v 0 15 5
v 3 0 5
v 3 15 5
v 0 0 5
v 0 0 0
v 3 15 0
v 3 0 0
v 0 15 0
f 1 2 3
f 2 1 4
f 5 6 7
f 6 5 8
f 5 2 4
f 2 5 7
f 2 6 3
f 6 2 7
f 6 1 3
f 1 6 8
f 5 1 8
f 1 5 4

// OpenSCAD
// Generated by SolidPython 1.0.1 on 2020-07-29 00:46:54


cube(size = [3, 15, 5]);
/***********************************************
*********      SolidPython code:      **********
************************************************
 
# import packages: SolidPython
from solid import *
from solid.utils import *
from itertools import chain, combinations, permutations


class Resize:

    def __init__(self, scad_file):
        self.scad_file = scad_file
        #self.scad_file = import_scad(scad_file)
        # cone/cylinder param:
        self.r1 = 0
        self.r2 = 0
        self.h = 0
        # rectangular prism param:
        self.w = 0
        self.l = 0
        # ellipse param:
        self.r = 0

    # import OpenScad code (file name corresponds to shape)


    # classify shape + parameters
    def assign(self, param1, param2, param3):
        if self.scad_file == 'cone.scad':
            self.r1 = param1
            self.r2 = param2
            self.h = param3
        elif self.scad_file == 'cylinder.scad':
            self.r1 = param1
            self.r2 = param2
            self.h = param3
        elif self.scad_file == 'rectangularPrism.scad':
            self.h = param1
            self.l = param2
            self.w = param3
        else:
            self.r = param1
            self.h = param2

    # resize parameters
    def iterate(self):
        x = range(3, 20, 2)
        i = 1
        if self.scad_file == 'cone.scad':
            tempList = list(permutations(x, 2))
            for temp in tempList:
                param1 = temp[0]
                param2 = temp[1]
                filepath = 'produced_scad_files/' + 'cone' + str(param1) + '_' + str(param2) + '_' + '.scad'
                scad_render_to_file(cylinder(h=param1, r1=param2, r2=0), filepath)

        elif self.scad_file == 'cylinder.scad':
            tempList = list(permutations(x, 3))
            for temp in tempList:
                param1 = temp[0]
                param2 = temp[1]
                filepath = 'produced_scad_files/' + 'cylinder' + str(param1) + '_' + str(param2) + '_' + '.scad'
                scad_render_to_file(cylinder(h=param1, r1=param2, r2=param2), filepath)

        elif self.scad_file == 'rectangularPrism.scad':
            tempList = list(permutations(x, 3))
            for temp in tempList:
                param1 = temp[0]
                param2 = temp[1]
                param3 = temp[2]
                filepath = 'produced_scad_files/' + 'rectangularPrism' + str(param1) + '_' + str(param2) + '_' + str(
                    param3) + '.scad'
                scad_render_to_file(cube(size=(param1, param2, param3)), filepath)

        elif self.scad_file == 'ellipse.scad':
            tempList = list(permutations(x, 4))
            for temp in tempList:
                param1 = temp[0]
                param2 = temp[1]
                param3 = temp[2]
                param4 = temp[3]
                filepath = 'produced_scad_files/' + 'ellipse' + str(param1) + '_' + str(param2) + '_' + str(param3) + '_' + str(param4) + '.scad'
                scad_render_to_file(scale([param1, param2, param3])(sphere(r=param4)), filepath)

    def render_to_scadfile(self):
        scad_render_to_file(scad, 'example.scad') 
 
************************************************/
